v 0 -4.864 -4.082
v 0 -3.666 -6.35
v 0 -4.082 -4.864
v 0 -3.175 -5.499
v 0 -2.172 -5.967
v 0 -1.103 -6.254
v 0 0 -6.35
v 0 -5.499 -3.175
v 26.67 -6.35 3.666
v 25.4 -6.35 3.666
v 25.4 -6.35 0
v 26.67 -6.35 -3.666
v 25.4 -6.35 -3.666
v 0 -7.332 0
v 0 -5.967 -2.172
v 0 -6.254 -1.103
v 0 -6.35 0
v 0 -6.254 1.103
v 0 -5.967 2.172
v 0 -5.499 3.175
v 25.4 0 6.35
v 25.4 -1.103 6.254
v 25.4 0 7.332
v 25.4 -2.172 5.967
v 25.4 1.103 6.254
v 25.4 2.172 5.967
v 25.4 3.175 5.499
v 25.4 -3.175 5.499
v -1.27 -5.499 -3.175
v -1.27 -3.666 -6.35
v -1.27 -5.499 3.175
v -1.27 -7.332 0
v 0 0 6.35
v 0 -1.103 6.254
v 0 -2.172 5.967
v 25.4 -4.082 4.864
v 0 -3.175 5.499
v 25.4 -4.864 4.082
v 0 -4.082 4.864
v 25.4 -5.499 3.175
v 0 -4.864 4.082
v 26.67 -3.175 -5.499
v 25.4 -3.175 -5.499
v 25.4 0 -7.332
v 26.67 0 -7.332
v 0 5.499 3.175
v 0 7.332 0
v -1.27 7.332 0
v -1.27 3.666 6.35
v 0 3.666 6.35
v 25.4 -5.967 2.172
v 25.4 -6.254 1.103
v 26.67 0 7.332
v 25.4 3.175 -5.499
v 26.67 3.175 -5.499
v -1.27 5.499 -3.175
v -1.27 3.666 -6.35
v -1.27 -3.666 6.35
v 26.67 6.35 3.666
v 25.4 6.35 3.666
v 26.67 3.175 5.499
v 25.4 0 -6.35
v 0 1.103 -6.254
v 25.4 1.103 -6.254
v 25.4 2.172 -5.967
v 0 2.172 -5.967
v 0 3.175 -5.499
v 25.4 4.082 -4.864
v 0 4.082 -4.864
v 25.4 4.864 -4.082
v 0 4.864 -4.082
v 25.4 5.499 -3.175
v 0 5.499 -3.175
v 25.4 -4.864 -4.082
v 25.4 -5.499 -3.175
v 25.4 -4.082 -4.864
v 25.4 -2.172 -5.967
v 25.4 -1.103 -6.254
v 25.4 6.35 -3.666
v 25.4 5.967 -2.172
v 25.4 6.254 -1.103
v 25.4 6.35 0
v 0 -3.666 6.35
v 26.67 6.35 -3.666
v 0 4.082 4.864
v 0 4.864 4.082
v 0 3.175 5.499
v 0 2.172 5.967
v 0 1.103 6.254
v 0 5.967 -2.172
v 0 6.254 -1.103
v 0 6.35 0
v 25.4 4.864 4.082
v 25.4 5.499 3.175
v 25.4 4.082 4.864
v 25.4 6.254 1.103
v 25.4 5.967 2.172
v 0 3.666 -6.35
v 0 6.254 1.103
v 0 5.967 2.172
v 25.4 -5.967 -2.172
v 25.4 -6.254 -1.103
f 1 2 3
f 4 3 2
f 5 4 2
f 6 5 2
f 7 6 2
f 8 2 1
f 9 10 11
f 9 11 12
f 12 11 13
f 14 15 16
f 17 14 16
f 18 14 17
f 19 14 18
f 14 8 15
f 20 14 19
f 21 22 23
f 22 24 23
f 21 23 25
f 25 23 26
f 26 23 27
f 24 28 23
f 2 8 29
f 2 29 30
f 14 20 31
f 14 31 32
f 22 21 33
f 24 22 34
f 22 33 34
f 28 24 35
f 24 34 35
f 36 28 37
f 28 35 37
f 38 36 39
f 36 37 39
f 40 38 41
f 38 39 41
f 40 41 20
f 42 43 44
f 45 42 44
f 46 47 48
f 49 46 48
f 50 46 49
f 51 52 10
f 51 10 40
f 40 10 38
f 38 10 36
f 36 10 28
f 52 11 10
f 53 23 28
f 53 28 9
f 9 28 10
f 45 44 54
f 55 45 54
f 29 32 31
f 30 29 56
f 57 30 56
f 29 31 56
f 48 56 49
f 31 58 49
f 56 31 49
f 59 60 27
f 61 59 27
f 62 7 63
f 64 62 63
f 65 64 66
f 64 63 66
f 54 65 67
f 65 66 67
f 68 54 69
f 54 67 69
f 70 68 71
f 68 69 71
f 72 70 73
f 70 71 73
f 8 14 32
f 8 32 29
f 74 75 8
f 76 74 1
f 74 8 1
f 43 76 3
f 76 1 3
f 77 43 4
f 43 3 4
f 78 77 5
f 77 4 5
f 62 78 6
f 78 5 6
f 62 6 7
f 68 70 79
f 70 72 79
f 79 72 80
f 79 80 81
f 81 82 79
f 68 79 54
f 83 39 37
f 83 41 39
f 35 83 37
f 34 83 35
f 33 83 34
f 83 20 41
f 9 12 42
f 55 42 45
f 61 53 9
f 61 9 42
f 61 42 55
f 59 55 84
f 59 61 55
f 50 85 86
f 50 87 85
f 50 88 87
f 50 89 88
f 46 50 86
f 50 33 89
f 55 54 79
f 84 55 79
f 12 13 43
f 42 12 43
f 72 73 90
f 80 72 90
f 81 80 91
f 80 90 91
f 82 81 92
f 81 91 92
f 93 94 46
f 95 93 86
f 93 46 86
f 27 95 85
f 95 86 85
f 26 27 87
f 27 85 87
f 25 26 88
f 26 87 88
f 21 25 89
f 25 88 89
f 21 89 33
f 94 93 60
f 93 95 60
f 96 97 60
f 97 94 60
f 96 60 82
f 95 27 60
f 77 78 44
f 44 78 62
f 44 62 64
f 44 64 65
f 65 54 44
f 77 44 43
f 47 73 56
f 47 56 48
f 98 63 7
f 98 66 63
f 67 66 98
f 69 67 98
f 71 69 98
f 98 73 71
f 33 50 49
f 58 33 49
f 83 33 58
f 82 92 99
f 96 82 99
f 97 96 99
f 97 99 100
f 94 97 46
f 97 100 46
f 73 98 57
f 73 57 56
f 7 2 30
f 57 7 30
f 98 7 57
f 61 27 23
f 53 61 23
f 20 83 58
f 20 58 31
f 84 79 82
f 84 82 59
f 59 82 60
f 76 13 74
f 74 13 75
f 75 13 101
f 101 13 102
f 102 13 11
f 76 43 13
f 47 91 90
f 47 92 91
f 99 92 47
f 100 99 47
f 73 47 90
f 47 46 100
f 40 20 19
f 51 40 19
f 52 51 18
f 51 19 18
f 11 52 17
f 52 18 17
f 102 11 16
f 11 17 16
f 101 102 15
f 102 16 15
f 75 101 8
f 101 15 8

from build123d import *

# Parameters (mm, degrees)
F1_DEPTH = 25.4
F3_DEPTH = 1.27
F4_DEPTH = 1.27


with BuildPart() as f1:
    # F0 (on Right) → F1 (new body)
    with BuildSketch(Plane.YZ):
        with BuildLine():
            ThreePointArc((5.4992613166, -3.1749999956), (6.1336289976, -1.6435009339), (6.35, 0))
            ThreePointArc((6.35, 0), (6.1336289982, 1.6435009317), (5.4992613189, 3.1749999916))
            ThreePointArc((5.4992613189, 3.1749999916), (3.1750000042, 5.4992613116), (0, 6.35))
            ThreePointArc((0, 6.35), (-3.1750000022, 5.4992613128), (-5.4992613166, 3.1749999956))
            ThreePointArc((-5.4992613166, 3.1749999956), (-6.35, 5.57e-08), (-5.4992613723, -3.1749998991))
            ThreePointArc((-5.4992613723, -3.1749998991), (-3.1750000504, -5.4992612849), (0, -6.35))
            ThreePointArc((0, -6.35), (3.1750000022, -5.4992613128), (5.4992613166, -3.1749999956))
        make_face()
    extrude(amount=F1_DEPTH)

    # F2 (on face) → F3 (join)
    with BuildSketch(Plane.YZ.offset(25.4)):
        with BuildLine():
            ThreePointArc((3.1750003445, -5.4992611151), (5.4992614135, -3.1749998278), (6.35, 0))
            ThreePointArc((6.35, 0), (5.4992613234, 3.1749999838), (3.1750000324, 5.4992612953))
            ThreePointArc((3.1750000324, 5.4992612953), (5.57e-08, 6.35), (-3.174999936, 5.499261351))
            ThreePointArc((-3.174999936, 5.499261351), (-5.4992612955, 3.175000032), (-6.35, 0))
            ThreePointArc((-6.35, 0), (-5.4992613963, -3.1749998576), (-3.1750002849, -5.4992611496))
            ThreePointArc((-3.1750002849, -5.4992611496), (3.44e-08, -6.35), (3.1750003445, -5.4992611151))
        make_face()
        with BuildLine():
            Line((6.35, 0), (6.35, 3.6661742094))
            Line((6.35, 3.6661742094), (3.1750000324, 5.4992612953))
            ThreePointArc((3.1750000324, 5.4992612953), (5.4992613234, 3.1749999838), (6.35, 0))
        make_face()
        with BuildLine():
            Line((-6.35, -3.6661742094), (-3.1750002849, -5.4992611496))
            ThreePointArc((-3.1750002849, -5.4992611496), (-5.4992613963, -3.1749998576), (-6.35, 0))
            Line((-6.35, 0), (-6.35, -3.6661742094))
        make_face()
        with BuildLine():
            Line((6.35, -3.6661742094), (6.35, 0))
            ThreePointArc((6.35, 0), (5.4992614135, -3.1749998278), (3.1750003445, -5.4992611151))
            Line((3.1750003445, -5.4992611151), (6.35, -3.6661742094))
        make_face()
        with BuildLine():
            ThreePointArc((-3.174999936, 5.499261351), (5.57e-08, 6.35), (3.1750000324, 5.4992612953))
            Line((3.1750000324, 5.4992612953), (0, 7.3323484187))
            Line((0, 7.3323484187), (-3.174999936, 5.499261351))
        make_face()
        with BuildLine():
            Line((0, -7.3323484187), (3.1750003445, -5.4992611151))
            ThreePointArc((3.1750003445, -5.4992611151), (3.44e-08, -6.35), (-3.1750002849, -5.4992611496))
            Line((-3.1750002849, -5.4992611496), (0, -7.3323484187))
        make_face()
        with BuildLine():
            ThreePointArc((-6.35, 0), (-5.4992612955, 3.175000032), (-3.174999936, 5.499261351))
            Line((-3.174999936, 5.499261351), (-6.35, 3.6661742094))
            Line((-6.35, 3.6661742094), (-6.35, 0))
        make_face()
    extrude(amount=F3_DEPTH)

    # F0 (on Right) → F4 (join)
    with BuildSketch(Plane.YZ):
        with BuildLine():
            ThreePointArc((5.4992613189, 3.1749999916), (6.1336289982, 1.6435009317), (6.35, 0))
            ThreePointArc((6.35, 0), (6.1336289976, -1.6435009339), (5.4992613166, -3.1749999956))
            Line((5.4992613166, -3.1749999956), (7.3323484187, 0))
            Line((7.3323484187, 0), (5.4992613189, 3.1749999916))
        make_face()
        with BuildLine():
            ThreePointArc((-5.4992613723, -3.1749998991), (-6.35, 5.57e-08), (-5.4992613166, 3.1749999956))
            Line((-5.4992613166, 3.1749999956), (-7.3323484187, 0))
            Line((-7.3323484187, 0), (-5.4992613723, -3.1749998991))
        make_face()
        with BuildLine():
            ThreePointArc((0, 6.35), (3.1750000042, 5.4992613116), (5.4992613189, 3.1749999916))
            Line((5.4992613189, 3.1749999916), (3.6661742094, 6.35))
            Line((3.6661742094, 6.35), (0, 6.35))
        make_face()
        with BuildLine():
            Line((3.6661742094, -6.35), (5.4992613166, -3.1749999956))
            ThreePointArc((5.4992613166, -3.1749999956), (3.1750000022, -5.4992613128), (0, -6.35))
            Line((0, -6.35), (3.6661742094, -6.35))
        make_face()
        with BuildLine():
            ThreePointArc((-5.4992613166, 3.1749999956), (-3.1750000022, 5.4992613128), (0, 6.35))
            Line((0, 6.35), (-3.6661742094, 6.35))
            Line((-3.6661742094, 6.35), (-5.4992613166, 3.1749999956))
        make_face()
        with BuildLine():
            Line((-3.6661742094, -6.35), (0, -6.35))
            ThreePointArc((0, -6.35), (-3.1750000504, -5.4992612849), (-5.4992613723, -3.1749998991))
            Line((-5.4992613723, -3.1749998991), (-3.6661742094, -6.35))
        make_face()
        with BuildLine():
            ThreePointArc((5.4992613166, -3.1749999956), (6.1336289976, -1.6435009339), (6.35, 0))
            ThreePointArc((6.35, 0), (6.1336289982, 1.6435009317), (5.4992613189, 3.1749999916))
            ThreePointArc((5.4992613189, 3.1749999916), (3.1750000042, 5.4992613116), (0, 6.35))
            ThreePointArc((0, 6.35), (-3.1750000022, 5.4992613128), (-5.4992613166, 3.1749999956))
            ThreePointArc((-5.4992613166, 3.1749999956), (-6.35, 5.57e-08), (-5.4992613723, -3.1749998991))
            ThreePointArc((-5.4992613723, -3.1749998991), (-3.1750000504, -5.4992612849), (0, -6.35))
            ThreePointArc((0, -6.35), (3.1750000022, -5.4992613128), (5.4992613166, -3.1749999956))
        make_face()
    extrude(amount=-F4_DEPTH)


solid = f1.part
